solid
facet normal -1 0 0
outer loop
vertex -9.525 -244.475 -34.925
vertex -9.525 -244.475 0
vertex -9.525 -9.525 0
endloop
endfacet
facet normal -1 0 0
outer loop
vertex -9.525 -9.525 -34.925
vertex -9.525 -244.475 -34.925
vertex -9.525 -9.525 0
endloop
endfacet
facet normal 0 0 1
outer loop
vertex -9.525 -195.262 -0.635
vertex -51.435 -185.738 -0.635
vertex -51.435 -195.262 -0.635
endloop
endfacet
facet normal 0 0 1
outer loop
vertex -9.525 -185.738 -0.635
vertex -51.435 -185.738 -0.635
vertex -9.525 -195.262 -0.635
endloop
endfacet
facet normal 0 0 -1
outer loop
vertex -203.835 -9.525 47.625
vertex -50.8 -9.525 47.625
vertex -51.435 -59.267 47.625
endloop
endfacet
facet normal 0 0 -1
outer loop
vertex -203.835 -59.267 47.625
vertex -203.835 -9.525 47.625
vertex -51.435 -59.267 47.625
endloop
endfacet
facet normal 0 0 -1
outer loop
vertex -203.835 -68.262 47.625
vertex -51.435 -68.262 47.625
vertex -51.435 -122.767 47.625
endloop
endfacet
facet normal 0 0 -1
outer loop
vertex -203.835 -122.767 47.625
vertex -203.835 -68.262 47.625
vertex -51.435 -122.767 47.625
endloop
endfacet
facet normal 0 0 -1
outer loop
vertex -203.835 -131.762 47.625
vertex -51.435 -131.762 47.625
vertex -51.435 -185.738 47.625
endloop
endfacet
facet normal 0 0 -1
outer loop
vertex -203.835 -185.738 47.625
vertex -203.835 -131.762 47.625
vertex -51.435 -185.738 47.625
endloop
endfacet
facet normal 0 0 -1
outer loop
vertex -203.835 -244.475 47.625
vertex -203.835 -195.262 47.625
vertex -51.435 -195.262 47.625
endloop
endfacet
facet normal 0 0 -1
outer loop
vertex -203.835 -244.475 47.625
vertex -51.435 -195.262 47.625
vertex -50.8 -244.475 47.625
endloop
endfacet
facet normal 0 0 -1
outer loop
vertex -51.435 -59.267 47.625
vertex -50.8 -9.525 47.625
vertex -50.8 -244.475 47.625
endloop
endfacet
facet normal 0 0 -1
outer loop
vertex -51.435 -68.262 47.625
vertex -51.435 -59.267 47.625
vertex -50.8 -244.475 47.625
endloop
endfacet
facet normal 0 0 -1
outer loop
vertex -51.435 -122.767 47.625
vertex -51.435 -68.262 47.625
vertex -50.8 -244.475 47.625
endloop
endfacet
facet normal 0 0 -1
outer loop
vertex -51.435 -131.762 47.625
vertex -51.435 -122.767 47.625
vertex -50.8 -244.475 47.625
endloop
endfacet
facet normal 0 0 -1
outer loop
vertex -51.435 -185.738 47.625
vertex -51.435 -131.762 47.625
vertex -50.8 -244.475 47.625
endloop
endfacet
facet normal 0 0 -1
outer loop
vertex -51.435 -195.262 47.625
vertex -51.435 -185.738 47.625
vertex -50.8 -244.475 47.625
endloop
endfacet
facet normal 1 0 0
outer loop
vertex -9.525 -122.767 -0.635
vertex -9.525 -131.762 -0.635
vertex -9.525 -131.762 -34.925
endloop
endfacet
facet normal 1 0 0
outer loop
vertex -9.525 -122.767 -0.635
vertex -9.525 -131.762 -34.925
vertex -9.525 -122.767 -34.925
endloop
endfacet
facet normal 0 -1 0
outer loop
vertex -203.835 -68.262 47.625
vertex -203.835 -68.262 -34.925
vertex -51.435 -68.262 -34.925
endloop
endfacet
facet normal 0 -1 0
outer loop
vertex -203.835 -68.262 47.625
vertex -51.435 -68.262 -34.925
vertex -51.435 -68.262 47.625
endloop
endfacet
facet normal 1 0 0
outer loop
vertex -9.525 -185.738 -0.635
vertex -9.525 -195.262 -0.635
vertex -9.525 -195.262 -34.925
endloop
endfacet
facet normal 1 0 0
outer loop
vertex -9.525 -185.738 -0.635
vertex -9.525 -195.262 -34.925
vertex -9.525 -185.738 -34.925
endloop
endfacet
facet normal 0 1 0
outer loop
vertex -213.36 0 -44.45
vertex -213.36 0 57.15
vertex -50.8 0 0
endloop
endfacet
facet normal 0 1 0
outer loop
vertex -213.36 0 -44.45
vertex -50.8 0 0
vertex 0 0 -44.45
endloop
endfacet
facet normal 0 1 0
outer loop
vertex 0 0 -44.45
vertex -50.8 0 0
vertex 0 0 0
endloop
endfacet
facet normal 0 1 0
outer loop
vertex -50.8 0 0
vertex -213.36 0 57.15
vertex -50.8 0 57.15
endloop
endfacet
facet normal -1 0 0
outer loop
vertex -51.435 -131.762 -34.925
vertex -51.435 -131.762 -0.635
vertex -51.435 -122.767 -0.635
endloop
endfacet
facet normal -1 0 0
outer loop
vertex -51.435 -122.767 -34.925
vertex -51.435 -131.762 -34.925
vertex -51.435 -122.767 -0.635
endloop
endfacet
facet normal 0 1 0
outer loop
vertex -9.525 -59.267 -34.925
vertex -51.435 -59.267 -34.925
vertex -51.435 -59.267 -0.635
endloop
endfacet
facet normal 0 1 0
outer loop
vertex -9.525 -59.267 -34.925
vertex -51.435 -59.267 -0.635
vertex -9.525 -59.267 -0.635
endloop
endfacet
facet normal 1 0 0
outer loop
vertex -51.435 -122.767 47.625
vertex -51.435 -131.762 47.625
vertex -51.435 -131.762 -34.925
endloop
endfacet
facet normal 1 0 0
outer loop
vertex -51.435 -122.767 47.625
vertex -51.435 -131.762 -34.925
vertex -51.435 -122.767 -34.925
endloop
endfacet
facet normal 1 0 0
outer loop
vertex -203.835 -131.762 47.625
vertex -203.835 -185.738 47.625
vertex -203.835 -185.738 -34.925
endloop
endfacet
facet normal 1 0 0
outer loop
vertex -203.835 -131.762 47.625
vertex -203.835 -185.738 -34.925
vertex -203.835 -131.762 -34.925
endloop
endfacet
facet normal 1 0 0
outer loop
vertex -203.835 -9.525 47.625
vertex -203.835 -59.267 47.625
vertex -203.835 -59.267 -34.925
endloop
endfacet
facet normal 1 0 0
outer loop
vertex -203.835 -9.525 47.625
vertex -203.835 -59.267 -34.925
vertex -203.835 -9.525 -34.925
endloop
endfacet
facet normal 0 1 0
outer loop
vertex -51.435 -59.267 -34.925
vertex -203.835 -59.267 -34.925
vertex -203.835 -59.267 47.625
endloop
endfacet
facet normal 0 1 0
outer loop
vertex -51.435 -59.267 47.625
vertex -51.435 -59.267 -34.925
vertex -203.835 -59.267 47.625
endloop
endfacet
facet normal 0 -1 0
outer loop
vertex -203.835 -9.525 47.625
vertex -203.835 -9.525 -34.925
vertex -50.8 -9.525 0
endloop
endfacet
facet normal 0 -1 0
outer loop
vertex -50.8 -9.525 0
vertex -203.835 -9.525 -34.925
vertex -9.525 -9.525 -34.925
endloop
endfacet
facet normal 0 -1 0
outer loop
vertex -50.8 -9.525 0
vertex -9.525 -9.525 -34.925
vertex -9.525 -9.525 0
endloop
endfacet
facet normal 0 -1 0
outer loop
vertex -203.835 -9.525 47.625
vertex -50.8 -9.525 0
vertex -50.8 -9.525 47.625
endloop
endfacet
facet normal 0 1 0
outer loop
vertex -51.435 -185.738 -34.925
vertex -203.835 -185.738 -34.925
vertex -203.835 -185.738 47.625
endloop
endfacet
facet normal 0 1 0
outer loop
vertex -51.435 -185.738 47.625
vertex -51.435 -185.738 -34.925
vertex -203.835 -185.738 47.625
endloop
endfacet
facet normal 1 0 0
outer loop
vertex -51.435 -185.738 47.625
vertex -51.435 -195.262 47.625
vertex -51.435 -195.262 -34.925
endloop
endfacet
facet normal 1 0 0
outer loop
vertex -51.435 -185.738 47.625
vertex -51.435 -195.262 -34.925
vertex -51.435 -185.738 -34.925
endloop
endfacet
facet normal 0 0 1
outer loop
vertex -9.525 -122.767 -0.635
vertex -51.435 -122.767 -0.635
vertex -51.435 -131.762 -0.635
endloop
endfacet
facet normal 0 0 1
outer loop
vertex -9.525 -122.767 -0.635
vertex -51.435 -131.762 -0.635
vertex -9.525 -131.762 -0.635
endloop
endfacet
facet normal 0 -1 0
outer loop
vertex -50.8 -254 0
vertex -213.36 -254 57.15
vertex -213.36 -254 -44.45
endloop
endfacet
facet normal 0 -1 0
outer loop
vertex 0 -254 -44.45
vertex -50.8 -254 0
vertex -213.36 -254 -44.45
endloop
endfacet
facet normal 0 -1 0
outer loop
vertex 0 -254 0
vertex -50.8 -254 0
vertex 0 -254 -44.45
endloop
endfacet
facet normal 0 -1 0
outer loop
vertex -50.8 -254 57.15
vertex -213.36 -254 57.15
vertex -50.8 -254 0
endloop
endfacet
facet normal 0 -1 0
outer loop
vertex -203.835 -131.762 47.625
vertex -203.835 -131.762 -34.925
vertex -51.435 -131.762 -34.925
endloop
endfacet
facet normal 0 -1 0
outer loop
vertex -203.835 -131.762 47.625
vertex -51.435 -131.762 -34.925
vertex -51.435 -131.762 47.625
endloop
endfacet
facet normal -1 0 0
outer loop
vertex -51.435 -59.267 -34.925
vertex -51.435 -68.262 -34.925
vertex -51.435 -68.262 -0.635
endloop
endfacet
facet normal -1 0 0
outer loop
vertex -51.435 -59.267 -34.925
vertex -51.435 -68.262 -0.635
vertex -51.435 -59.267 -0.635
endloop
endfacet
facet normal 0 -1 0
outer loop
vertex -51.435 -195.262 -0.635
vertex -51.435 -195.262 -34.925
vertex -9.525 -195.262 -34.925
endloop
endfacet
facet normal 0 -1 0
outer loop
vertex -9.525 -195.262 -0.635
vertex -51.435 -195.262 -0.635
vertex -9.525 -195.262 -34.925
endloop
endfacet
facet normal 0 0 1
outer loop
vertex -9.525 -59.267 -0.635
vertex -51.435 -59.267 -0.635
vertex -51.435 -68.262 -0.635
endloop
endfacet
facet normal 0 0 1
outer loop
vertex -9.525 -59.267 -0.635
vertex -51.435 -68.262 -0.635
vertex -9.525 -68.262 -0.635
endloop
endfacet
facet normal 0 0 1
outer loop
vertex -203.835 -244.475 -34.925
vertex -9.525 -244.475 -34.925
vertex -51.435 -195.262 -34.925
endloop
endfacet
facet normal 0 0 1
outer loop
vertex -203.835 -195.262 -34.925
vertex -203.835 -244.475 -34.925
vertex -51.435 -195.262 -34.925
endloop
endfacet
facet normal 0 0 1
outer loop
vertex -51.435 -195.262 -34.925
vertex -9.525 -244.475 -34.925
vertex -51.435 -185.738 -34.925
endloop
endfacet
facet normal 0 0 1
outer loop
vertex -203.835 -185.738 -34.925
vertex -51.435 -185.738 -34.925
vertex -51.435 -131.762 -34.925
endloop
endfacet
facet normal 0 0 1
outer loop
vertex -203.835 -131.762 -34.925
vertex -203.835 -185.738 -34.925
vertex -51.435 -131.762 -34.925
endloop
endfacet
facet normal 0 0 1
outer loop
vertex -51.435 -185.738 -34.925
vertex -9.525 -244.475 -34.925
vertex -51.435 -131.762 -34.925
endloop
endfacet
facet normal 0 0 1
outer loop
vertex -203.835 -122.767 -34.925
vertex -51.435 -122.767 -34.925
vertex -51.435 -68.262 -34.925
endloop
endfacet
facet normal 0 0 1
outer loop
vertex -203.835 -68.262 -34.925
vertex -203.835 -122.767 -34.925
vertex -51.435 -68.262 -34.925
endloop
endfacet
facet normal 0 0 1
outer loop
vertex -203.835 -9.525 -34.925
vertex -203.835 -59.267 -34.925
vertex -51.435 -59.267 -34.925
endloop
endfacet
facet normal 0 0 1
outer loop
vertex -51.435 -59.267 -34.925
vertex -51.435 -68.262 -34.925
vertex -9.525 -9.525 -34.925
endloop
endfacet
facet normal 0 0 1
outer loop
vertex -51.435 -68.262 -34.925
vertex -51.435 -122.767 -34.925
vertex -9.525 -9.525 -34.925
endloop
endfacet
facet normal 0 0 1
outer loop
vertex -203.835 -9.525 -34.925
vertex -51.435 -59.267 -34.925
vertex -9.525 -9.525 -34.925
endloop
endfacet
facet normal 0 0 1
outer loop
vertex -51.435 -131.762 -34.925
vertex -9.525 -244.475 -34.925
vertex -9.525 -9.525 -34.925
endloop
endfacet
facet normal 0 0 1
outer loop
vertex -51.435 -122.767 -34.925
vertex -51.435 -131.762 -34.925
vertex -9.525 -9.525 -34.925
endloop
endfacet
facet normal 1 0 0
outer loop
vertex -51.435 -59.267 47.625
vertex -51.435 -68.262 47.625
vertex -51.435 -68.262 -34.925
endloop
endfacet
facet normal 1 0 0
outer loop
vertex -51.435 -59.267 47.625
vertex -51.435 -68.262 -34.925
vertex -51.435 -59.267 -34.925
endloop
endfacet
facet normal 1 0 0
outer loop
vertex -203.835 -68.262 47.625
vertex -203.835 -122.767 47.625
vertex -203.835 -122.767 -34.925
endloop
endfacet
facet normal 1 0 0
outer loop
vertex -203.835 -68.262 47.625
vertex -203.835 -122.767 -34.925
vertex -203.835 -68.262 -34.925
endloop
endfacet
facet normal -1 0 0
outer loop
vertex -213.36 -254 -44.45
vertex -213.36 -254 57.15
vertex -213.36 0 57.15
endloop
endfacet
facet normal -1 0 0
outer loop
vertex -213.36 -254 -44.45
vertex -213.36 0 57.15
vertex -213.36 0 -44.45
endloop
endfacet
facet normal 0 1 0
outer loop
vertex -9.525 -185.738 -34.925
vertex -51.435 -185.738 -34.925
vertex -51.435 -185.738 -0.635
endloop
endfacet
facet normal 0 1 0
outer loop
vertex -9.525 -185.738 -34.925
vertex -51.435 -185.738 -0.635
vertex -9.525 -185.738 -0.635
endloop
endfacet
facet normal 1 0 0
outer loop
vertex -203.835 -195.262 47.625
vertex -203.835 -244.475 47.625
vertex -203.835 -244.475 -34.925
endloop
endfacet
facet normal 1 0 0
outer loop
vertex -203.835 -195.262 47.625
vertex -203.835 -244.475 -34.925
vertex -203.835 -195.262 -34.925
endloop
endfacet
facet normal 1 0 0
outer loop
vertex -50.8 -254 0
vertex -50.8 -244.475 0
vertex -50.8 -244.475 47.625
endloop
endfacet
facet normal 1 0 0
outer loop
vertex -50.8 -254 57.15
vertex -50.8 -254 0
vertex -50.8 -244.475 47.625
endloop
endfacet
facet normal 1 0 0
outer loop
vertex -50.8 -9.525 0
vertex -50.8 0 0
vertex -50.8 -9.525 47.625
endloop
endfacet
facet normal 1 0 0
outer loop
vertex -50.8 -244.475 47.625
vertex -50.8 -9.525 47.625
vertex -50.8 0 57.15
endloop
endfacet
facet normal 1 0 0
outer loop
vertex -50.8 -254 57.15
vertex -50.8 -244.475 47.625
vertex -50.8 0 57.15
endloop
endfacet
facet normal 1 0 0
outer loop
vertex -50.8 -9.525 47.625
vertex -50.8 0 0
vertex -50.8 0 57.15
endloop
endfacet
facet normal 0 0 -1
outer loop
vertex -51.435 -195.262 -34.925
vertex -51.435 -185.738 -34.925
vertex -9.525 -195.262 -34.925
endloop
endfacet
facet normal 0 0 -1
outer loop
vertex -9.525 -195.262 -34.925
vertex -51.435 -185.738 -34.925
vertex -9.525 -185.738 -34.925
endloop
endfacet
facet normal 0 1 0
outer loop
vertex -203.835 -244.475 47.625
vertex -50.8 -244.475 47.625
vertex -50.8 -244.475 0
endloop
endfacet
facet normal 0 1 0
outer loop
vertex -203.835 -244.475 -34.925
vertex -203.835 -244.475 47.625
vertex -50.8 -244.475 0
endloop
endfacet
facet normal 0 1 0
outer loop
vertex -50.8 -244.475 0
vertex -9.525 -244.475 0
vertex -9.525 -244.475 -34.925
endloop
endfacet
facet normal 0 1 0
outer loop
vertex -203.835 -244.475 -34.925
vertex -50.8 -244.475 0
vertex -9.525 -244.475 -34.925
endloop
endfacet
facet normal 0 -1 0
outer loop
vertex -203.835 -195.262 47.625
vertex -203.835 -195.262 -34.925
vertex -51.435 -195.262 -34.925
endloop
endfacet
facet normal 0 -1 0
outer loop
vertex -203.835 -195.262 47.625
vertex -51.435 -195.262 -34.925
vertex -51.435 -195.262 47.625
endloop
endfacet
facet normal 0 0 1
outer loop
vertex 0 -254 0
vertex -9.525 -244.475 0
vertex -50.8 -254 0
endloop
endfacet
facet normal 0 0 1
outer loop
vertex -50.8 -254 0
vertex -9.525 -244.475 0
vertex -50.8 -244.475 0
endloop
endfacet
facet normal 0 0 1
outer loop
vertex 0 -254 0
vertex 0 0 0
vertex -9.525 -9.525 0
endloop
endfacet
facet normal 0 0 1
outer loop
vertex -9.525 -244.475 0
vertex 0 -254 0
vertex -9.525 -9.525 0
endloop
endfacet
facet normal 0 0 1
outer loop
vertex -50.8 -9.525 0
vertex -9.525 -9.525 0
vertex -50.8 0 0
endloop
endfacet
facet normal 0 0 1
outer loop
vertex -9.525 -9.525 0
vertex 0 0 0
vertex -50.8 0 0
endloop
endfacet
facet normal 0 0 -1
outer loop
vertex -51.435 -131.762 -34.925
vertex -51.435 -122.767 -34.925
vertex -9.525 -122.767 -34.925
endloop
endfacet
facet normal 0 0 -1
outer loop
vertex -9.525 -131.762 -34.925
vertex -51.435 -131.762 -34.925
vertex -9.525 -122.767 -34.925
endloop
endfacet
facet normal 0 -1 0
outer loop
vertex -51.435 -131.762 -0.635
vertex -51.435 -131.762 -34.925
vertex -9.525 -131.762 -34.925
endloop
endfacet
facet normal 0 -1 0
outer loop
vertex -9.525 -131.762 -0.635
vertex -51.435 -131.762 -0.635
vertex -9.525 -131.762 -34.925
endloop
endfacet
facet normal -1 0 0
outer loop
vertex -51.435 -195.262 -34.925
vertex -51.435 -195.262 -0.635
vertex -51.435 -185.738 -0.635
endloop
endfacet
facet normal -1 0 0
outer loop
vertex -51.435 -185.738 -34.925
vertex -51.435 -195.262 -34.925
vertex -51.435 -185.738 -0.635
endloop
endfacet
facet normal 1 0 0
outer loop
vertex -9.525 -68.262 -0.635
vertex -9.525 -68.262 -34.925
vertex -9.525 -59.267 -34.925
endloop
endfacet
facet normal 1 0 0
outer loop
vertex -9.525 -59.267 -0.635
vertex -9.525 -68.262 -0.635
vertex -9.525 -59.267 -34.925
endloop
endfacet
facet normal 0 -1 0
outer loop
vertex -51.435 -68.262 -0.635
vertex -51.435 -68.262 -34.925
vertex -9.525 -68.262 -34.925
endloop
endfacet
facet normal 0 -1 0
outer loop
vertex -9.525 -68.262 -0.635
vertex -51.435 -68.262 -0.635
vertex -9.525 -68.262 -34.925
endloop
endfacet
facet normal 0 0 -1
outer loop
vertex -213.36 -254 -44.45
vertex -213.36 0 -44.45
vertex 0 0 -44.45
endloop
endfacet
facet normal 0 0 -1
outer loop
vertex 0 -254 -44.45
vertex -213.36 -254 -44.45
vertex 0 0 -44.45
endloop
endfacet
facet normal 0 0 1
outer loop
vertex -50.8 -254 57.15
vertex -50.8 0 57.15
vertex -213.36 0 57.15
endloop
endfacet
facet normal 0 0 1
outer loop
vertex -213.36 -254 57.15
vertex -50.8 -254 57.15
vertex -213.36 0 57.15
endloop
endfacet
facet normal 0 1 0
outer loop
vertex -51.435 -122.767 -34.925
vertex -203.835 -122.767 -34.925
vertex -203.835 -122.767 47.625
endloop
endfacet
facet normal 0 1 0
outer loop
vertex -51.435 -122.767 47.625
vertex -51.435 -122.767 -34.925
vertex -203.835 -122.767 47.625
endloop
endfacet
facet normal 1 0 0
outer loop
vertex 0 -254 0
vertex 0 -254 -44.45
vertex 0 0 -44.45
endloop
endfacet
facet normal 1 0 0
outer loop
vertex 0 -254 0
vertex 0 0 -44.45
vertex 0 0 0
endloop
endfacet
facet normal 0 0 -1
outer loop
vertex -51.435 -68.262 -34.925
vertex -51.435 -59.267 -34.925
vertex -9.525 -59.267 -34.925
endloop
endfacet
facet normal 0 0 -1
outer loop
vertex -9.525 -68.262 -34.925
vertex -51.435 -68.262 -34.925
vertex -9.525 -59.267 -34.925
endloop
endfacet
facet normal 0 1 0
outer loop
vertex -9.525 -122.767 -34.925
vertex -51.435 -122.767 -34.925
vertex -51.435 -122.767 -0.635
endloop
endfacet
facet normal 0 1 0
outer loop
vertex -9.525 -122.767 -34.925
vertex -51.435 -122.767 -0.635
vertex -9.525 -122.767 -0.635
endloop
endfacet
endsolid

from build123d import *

# Parameters (mm, degrees)
F1_DEPTH = 254
F2_W     = 41.275
F2_H     = 234.95
F3_DEPTH = 34.925
F5_DEPTH = 153.035
F6_W     = 4.2333333333
F6_H     = 82.55
F6_W_2   = 4.7625
F7_DEPTH = 152.4
F8_W     = 41.91
F8_H     = 8.9958333333
F9_DEPTH = 34.29
F8_H_2   = 9.525


with BuildPart() as f1:
    # F0 (on Front) → F1 (new body)
    with BuildSketch(Plane.XZ):
        Polygon((-50.8, 57.15), (-213.36, 57.15), (-213.36, -44.45), (0, -44.45), (0, 0), (-50.8, 0), align=None)
    extrude(amount=F1_DEPTH)

    # F2 (on face) → F3 (cut)
    with BuildSketch(Plane.XY):
        with Locations((-30.1625, -127)):
            Rectangle(F2_W, F2_H)
    extrude(amount=-F3_DEPTH, mode=Mode.SUBTRACT)

    # F4 (on face) → F5 (cut)
    with BuildSketch(Plane.YZ.offset(-50.8)):
        Polygon((-244.475, 47.625), (-244.475, 0), (-244.475, -34.925), (-9.525, -34.925), (-9.525, 0), (-9.525, 47.625), align=None)
    extrude(amount=-F5_DEPTH, mode=Mode.SUBTRACT)

    # F6 (on face) → F7 (join)
    with BuildSketch(Plane.YZ.offset(-203.835)):
        with Locations((-124.8833333333, 6.35)):
            Rectangle(F6_W, F6_H)
        with Locations((-129.38125, 6.35)):
            Rectangle(F6_W_2, F6_H)
        with Locations((-65.88125, 6.35)):
            Rectangle(F6_W_2, F6_H)
        with Locations((-61.3833333333, 6.35)):
            Rectangle(F6_W, F6_H)
        with Locations((-192.88125, 6.35)):
            Rectangle(F6_W_2, F6_H)
        with Locations((-188.11875, 6.35)):
            Rectangle(F6_W_2, F6_H)
    extrude(amount=F7_DEPTH)


with BuildPart() as f9:
    # F8 (on face) → F9 (new body)
    with BuildSketch(Plane.XY.offset(-34.925)):
        with Locations((-30.48, -63.7645833333)):
            Rectangle(F8_W, F8_H)
    extrude(amount=F9_DEPTH)


with BuildPart() as f9b:
    # F8 (on face) → F9, piece 2 (new body)
    with BuildSketch(Plane.XY.offset(-34.925)):
        with Locations((-30.48, -127.2645833333)):
            Rectangle(F8_W, F8_H)
    extrude(amount=F9_DEPTH)


with BuildPart() as f9c:
    # F8 (on face) → F9, piece 3 (new body)
    with BuildSketch(Plane.XY.offset(-34.925)):
        with Locations((-30.48, -190.5)):
            Rectangle(F8_W, F8_H_2)
    extrude(amount=F9_DEPTH)


solid = Compound([f1.part, f9.part, f9b.part, f9c.part])
